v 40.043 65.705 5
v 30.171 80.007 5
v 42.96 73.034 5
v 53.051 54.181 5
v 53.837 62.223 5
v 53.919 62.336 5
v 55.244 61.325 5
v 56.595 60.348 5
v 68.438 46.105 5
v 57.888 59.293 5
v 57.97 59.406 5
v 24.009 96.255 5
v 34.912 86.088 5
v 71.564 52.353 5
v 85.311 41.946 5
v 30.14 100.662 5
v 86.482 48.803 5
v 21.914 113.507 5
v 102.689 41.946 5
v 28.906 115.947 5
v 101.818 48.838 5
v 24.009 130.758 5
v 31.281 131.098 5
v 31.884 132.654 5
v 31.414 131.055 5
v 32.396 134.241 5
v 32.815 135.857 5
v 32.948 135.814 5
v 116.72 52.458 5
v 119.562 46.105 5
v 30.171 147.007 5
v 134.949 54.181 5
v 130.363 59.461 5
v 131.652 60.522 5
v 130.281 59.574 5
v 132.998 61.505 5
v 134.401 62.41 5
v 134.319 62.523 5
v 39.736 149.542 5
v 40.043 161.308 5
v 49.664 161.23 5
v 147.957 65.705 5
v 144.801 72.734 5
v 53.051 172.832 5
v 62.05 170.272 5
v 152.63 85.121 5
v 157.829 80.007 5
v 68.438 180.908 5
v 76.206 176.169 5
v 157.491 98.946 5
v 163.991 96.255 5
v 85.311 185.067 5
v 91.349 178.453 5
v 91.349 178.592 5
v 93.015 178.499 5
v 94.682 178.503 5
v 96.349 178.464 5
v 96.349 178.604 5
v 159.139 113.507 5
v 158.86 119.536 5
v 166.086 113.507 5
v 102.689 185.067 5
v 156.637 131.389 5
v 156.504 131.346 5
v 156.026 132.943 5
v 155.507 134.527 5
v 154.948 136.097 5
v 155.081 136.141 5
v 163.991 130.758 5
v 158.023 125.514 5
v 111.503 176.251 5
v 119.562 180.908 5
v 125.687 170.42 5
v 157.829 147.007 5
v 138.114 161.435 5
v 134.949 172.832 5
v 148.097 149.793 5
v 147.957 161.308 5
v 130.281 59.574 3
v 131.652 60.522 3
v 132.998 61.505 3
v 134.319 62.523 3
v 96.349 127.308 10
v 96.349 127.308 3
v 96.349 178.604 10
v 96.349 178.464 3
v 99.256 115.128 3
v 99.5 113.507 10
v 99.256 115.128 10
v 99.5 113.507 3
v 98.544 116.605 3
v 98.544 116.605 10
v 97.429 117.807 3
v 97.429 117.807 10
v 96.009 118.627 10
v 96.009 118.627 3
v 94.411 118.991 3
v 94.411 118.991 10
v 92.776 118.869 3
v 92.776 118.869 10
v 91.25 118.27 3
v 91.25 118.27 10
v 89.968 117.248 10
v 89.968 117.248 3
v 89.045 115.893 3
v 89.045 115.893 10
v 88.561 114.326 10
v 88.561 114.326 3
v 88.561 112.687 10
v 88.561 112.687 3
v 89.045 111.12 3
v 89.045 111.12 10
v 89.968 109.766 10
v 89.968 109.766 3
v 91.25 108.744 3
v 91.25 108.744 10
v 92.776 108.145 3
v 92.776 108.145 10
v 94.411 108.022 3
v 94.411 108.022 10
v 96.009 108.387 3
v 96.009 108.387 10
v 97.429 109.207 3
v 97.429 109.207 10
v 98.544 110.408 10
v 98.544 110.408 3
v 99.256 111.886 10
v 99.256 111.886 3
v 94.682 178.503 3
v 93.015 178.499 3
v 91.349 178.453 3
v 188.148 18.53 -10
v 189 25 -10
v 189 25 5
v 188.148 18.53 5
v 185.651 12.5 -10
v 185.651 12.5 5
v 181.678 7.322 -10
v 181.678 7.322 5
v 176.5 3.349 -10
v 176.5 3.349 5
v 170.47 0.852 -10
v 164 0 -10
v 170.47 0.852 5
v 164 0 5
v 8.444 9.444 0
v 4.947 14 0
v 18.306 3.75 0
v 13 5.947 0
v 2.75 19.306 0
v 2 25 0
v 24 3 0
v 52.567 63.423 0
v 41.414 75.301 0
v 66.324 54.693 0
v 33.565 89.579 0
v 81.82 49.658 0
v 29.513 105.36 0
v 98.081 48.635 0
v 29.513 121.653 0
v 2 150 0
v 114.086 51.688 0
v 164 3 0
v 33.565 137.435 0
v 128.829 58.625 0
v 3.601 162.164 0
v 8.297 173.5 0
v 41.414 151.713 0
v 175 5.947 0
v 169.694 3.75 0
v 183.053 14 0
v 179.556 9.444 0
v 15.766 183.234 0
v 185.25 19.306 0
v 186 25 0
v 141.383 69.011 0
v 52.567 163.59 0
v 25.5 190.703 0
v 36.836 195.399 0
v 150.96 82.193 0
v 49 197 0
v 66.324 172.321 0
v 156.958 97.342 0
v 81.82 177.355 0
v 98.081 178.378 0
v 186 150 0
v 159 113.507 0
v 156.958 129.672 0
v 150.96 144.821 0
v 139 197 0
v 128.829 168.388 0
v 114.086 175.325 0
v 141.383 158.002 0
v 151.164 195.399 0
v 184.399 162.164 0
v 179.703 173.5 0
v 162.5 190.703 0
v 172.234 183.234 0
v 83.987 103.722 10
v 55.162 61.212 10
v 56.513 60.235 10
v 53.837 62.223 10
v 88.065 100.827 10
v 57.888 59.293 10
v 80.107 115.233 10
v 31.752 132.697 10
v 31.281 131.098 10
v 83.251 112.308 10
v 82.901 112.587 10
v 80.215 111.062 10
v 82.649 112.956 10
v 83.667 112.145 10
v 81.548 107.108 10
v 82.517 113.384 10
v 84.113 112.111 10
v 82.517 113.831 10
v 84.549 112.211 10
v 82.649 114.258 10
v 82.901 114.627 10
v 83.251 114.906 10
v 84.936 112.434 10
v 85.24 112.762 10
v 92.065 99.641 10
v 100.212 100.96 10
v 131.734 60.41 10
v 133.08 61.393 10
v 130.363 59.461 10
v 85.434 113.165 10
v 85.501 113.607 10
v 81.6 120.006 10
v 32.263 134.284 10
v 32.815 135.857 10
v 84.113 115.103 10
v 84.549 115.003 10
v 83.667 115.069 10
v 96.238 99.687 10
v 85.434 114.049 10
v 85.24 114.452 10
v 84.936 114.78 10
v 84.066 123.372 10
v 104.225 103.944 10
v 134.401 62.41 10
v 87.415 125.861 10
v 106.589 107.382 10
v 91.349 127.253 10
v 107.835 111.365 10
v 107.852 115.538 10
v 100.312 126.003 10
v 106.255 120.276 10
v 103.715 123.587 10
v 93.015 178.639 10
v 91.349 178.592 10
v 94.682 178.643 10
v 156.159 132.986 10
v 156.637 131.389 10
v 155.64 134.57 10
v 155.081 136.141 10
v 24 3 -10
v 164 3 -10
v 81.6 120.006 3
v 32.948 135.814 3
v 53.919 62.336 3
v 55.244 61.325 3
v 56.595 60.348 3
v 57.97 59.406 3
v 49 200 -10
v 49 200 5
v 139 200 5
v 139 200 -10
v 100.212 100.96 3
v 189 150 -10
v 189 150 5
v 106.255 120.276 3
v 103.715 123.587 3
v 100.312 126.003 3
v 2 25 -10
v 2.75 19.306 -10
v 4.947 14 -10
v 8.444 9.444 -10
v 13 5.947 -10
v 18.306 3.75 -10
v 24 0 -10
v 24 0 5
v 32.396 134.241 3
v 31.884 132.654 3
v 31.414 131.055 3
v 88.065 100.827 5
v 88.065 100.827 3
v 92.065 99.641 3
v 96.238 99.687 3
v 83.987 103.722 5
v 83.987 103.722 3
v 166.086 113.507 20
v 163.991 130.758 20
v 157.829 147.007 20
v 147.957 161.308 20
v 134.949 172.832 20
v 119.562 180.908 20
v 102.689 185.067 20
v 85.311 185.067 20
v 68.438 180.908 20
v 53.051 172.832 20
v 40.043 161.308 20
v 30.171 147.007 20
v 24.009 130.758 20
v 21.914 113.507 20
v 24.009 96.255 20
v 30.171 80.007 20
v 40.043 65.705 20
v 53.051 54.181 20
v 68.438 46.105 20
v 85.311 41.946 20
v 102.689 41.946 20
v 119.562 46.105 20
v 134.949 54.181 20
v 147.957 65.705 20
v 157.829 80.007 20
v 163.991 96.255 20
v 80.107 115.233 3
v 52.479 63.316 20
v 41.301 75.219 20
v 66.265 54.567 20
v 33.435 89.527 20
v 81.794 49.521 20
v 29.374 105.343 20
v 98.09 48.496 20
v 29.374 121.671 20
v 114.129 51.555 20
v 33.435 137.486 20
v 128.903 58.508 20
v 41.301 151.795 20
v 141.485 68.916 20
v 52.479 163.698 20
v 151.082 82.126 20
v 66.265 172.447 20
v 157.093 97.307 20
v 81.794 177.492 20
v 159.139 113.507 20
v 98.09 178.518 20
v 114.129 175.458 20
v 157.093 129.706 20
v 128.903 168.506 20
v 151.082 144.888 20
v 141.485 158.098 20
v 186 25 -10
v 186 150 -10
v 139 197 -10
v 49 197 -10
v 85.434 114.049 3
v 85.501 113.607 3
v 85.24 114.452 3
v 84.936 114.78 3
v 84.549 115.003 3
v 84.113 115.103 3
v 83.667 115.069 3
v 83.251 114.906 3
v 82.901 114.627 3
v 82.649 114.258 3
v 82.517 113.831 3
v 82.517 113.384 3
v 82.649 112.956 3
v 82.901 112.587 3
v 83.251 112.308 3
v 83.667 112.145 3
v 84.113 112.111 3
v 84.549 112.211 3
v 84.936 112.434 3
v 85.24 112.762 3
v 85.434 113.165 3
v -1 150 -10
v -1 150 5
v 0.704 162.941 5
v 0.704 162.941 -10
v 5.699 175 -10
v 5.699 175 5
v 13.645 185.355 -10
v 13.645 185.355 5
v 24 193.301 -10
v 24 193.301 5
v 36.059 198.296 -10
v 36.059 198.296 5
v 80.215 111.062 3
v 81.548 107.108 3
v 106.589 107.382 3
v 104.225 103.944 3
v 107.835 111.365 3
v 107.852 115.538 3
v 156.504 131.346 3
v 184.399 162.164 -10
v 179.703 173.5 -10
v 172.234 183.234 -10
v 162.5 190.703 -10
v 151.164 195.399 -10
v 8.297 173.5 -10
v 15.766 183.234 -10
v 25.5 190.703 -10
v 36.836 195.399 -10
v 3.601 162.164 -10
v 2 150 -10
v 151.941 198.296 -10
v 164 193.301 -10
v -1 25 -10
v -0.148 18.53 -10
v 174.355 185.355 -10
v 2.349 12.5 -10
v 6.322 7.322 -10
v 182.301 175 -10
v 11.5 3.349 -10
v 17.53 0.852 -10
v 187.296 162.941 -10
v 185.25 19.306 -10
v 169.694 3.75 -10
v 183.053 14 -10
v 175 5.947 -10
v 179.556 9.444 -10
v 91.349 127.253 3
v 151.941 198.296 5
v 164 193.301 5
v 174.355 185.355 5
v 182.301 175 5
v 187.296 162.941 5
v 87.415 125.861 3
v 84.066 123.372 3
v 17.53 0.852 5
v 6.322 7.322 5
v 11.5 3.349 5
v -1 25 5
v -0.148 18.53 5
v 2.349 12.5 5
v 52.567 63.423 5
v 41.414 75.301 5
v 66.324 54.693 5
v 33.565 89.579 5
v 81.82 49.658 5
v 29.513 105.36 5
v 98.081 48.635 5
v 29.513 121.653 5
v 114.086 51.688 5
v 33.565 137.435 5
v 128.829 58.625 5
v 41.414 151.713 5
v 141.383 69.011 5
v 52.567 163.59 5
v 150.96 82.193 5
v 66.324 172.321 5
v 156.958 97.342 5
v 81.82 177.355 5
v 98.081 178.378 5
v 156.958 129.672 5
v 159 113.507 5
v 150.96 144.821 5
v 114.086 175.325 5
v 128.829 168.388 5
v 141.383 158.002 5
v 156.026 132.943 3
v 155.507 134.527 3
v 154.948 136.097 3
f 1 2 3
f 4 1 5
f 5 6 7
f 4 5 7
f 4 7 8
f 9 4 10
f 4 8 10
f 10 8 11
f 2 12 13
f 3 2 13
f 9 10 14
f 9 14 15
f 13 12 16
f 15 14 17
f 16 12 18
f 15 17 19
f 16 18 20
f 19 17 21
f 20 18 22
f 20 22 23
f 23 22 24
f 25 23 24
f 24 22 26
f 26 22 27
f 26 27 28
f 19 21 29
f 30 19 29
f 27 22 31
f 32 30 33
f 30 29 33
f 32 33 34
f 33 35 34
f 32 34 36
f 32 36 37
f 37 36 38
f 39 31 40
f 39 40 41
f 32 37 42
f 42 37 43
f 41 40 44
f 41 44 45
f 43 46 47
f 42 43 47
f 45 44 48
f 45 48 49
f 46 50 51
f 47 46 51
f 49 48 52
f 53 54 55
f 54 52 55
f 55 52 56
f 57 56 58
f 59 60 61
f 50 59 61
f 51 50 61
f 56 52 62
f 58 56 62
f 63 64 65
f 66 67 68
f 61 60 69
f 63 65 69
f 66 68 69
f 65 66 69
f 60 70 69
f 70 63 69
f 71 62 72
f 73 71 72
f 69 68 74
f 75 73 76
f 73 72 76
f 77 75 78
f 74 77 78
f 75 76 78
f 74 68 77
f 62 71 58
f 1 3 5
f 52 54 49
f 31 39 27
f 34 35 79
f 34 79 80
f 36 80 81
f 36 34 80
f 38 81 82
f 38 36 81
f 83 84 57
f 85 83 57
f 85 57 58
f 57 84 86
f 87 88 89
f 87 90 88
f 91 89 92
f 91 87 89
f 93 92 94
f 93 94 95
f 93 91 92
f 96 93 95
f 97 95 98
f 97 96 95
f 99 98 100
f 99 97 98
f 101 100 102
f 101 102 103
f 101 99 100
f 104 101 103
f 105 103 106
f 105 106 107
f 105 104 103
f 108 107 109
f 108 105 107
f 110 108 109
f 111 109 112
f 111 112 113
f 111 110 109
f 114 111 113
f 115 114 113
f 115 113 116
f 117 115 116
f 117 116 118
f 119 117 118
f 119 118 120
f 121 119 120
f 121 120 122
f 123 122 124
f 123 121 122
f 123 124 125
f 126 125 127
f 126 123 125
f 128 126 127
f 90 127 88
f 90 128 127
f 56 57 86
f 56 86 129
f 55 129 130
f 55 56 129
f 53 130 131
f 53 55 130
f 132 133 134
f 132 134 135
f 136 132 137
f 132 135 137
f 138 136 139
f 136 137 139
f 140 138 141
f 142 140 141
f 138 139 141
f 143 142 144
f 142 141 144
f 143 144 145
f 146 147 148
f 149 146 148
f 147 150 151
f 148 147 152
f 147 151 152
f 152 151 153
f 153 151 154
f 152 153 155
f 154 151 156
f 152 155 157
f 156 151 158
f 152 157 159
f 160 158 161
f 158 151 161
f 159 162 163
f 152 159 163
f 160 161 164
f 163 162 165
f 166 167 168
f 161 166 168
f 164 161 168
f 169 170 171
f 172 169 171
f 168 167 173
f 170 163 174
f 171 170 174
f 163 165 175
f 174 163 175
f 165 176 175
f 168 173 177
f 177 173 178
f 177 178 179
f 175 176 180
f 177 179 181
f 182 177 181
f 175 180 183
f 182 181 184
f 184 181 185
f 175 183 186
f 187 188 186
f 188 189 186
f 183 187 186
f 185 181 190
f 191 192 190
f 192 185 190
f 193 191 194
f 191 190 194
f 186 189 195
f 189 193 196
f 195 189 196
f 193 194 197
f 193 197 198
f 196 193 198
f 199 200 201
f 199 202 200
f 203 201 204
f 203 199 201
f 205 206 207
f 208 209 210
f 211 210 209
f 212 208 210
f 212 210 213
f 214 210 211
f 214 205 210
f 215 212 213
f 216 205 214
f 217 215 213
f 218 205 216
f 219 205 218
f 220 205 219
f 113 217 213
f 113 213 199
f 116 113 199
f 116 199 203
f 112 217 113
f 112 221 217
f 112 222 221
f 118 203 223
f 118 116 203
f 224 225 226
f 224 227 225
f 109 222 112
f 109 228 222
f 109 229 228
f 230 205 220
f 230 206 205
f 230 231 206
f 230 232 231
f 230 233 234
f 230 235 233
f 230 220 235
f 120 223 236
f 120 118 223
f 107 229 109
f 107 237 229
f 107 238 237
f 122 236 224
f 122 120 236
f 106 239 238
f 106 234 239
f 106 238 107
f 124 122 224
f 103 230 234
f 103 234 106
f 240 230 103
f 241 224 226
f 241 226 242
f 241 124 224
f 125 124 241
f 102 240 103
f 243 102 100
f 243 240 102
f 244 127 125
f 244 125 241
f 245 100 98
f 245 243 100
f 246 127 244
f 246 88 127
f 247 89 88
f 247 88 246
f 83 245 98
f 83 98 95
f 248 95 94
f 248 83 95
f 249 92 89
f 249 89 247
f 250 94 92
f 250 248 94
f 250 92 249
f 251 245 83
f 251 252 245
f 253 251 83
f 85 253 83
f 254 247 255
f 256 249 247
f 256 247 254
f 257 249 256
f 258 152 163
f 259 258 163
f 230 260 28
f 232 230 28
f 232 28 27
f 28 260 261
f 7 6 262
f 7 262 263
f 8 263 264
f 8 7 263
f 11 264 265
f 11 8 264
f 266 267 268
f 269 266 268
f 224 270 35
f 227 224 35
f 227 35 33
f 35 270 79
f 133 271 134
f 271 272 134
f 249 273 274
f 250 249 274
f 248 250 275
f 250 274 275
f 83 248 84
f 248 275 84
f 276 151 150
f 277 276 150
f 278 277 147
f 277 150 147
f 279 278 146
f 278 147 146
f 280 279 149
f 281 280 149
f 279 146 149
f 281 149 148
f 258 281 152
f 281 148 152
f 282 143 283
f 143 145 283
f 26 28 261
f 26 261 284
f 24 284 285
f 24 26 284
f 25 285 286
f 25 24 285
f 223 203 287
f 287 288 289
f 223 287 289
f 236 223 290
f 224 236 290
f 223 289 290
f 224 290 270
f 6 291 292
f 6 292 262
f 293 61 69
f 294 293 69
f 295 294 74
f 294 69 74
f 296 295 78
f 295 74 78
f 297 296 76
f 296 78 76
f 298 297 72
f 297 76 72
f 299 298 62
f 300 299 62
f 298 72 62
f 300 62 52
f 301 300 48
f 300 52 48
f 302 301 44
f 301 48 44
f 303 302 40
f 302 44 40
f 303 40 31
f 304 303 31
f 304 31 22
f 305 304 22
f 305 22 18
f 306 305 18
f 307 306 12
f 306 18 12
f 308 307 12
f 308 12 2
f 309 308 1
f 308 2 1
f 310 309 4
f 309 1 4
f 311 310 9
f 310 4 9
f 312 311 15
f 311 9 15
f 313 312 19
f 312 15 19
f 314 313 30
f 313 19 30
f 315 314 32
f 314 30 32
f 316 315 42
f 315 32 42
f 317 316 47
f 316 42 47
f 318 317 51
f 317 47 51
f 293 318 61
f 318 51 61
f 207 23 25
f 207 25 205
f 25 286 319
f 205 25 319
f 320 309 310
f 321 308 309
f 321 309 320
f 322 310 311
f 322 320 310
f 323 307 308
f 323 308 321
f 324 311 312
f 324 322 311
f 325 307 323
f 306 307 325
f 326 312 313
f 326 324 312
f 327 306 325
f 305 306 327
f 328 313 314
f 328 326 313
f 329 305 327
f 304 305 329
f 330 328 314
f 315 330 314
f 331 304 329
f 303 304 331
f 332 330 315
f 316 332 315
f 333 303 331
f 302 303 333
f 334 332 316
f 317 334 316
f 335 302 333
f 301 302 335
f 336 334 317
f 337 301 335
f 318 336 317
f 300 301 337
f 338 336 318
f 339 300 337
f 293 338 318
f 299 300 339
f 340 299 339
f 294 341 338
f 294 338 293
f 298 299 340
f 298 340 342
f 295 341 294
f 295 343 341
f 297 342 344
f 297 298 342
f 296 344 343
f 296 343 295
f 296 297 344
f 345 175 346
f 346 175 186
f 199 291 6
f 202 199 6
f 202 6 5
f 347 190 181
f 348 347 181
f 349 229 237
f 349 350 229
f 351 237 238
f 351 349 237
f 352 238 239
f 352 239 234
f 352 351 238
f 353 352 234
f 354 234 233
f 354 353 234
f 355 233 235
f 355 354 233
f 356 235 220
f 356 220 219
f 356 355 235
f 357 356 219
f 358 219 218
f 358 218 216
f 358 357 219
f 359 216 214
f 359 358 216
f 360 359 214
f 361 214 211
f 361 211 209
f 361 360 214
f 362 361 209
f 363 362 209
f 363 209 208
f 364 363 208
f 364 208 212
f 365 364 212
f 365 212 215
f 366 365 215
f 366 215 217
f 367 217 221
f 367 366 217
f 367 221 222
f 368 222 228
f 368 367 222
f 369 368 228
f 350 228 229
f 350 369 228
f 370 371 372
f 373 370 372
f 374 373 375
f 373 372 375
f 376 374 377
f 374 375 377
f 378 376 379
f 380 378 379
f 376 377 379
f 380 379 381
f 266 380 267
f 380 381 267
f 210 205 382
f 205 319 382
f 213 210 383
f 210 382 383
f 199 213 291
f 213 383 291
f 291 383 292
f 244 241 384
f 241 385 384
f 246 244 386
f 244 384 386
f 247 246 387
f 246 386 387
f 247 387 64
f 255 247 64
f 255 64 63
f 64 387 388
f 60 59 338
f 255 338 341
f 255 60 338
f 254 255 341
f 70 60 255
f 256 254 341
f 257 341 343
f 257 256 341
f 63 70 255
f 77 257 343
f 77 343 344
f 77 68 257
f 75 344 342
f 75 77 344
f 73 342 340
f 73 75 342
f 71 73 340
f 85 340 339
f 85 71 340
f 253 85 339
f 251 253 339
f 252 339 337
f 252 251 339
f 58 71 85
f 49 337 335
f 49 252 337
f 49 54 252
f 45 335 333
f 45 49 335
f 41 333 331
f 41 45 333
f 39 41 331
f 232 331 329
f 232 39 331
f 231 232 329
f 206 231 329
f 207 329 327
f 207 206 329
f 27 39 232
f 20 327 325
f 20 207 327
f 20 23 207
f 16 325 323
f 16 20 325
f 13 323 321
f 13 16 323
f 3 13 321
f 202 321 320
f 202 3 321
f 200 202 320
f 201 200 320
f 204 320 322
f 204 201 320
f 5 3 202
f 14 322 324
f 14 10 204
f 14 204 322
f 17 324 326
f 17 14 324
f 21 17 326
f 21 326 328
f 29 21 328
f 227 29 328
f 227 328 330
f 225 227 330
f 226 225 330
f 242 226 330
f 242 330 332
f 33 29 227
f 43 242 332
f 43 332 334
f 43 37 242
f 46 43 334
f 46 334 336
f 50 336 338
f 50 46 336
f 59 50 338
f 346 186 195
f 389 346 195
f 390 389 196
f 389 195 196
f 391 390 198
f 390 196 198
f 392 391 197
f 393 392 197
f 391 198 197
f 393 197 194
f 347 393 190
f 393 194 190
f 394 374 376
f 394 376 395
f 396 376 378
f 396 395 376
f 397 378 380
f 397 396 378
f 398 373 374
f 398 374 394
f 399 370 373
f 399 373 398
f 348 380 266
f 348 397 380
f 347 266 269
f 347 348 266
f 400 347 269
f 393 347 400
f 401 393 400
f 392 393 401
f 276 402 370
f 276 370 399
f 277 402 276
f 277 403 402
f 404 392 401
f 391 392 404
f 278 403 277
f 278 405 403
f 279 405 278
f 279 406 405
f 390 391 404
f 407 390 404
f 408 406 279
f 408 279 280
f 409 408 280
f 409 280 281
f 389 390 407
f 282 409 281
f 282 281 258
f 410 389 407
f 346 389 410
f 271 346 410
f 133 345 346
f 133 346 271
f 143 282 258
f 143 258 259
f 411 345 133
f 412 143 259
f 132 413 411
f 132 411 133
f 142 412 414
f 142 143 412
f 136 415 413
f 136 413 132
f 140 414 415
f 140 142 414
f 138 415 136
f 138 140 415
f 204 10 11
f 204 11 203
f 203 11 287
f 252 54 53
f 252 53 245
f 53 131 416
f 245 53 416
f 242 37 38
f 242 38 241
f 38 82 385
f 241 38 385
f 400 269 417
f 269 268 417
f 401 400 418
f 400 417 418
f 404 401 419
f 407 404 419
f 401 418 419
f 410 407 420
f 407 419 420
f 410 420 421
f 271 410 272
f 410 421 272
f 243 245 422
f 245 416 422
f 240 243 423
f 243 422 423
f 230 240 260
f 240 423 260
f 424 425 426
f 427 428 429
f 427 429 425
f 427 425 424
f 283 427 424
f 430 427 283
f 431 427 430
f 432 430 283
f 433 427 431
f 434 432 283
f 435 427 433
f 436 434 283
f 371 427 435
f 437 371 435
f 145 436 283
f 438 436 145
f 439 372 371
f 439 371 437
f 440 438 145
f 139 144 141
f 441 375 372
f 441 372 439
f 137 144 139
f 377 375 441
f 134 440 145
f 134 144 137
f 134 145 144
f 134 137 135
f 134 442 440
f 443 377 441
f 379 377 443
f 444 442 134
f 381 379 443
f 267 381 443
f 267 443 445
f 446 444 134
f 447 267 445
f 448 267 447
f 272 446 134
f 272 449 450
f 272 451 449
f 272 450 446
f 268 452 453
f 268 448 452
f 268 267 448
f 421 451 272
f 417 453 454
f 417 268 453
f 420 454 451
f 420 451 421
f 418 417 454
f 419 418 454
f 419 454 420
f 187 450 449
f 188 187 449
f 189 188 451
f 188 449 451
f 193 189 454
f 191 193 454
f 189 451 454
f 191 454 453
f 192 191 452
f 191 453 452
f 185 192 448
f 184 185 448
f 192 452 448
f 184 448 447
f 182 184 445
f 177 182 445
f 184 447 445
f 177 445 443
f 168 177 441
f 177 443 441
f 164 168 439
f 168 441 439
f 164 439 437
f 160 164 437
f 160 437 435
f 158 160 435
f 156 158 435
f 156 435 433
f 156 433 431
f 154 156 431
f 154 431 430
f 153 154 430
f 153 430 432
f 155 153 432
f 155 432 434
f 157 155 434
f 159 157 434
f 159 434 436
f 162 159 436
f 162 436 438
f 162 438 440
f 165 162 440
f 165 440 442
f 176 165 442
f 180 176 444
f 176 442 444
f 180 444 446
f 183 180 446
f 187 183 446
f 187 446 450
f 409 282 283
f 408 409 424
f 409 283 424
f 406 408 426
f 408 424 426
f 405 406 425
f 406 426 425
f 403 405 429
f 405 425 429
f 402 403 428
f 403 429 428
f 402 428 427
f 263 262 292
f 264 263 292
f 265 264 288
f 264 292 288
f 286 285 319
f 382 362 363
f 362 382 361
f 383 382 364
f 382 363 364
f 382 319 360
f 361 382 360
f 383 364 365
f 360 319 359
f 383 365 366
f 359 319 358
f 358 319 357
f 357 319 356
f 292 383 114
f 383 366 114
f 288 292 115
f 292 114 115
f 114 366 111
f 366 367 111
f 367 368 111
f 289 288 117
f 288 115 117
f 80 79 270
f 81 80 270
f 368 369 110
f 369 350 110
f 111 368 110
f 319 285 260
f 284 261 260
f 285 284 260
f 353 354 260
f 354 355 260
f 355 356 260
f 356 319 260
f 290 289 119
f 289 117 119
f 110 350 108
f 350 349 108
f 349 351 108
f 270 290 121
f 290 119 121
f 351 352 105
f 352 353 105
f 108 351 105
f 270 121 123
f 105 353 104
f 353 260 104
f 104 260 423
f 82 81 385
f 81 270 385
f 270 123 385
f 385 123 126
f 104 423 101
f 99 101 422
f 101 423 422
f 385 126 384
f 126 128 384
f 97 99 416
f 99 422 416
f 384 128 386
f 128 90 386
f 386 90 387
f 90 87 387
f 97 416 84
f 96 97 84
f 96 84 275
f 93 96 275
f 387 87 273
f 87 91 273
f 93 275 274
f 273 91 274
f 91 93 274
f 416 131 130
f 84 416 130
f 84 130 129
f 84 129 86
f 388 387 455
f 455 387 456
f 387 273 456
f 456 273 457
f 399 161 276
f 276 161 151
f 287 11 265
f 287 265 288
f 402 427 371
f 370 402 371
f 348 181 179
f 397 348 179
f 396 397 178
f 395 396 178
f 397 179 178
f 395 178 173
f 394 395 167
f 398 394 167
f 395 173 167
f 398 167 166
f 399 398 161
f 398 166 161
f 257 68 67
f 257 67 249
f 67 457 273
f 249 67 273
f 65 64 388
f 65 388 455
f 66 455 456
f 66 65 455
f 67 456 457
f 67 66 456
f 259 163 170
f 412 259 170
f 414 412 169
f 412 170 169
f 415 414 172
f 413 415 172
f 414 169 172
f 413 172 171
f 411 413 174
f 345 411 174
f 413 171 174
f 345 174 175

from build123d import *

# Parameters (mm, degrees)
F1_DEPTH  = 5
F3_DEPTH  = 10
F4_R      = 65
F5_DEPTH  = 25
F6_R      = 1.5
F6_R_2    = 5.5
F7_DEPTH  = 2
F8_R      = 5
F9_DEPTH  = 25
F10_R     = 1.5
F11_DEPTH = 25
F12_DEPTH = 25
F13_DEPTH = 25
F14_R     = 72.085840391
F14_R_2   = 65.1394362423
F15_DEPTH = 15
F16_DEPTH = 5


with BuildPart() as f1:
    # F0 (on Top) → F1 (new body)
    with BuildSketch(Plane.XY):
        with BuildLine():
            Line((139, 200), (49, 200))
            ThreePointArc((49, 200), (13.6446609407, 185.3553390593), (-1, 150))
            Line((-1, 150), (-1, 25))
            ThreePointArc((-1, 25), (6.3223304703, 7.3223304703), (24, 0))
            Line((24, 0), (164, 0))
            ThreePointArc((164, 0), (181.6776695297, 7.3223304703), (189, 25))
            Line((189, 25), (189, 150))
            ThreePointArc((189, 150), (174.3553390593, 185.3553390593), (139, 200))
        make_face()
    extrude(amount=F1_DEPTH)

    # F2 (on face) → F3 (join)
    with BuildSketch(Plane(origin=(0, 0, 0), x_dir=(1, 0, 0), z_dir=(0, 0, -1))):
        with BuildLine():
            Line((49, -200), (139, -200))
            ThreePointArc((139, -200), (174.3553390593, -185.3553390593), (189, -150))
            Line((189, -150), (189, -25))
            ThreePointArc((189, -25), (181.6776695297, -7.3223304703), (164, 0))
            Line((164, 0), (24, 0))
            ThreePointArc((24, 0), (6.3223304703, -7.3223304703), (-1, -25))
            Line((-1, -25), (-1, -150))
            ThreePointArc((-1, -150), (13.6446609407, -185.3553390593), (49, -200))
        make_face()
        with BuildLine():
            Line((186, -25), (186, -150))
            ThreePointArc((186, -150), (172.2340187158, -183.2340187158), (139, -197))
            Line((139, -197), (49, -197))
            ThreePointArc((49, -197), (15.7659812842, -183.2340187158), (2, -150))
            Line((2, -150), (2, -25))
            ThreePointArc((2, -25), (8.4436508139, -9.4436508139), (24, -3))
            Line((24, -3), (164, -3))
            ThreePointArc((164, -3), (179.5563491861, -9.4436508139), (186, -25))
        make_face(mode=Mode.SUBTRACT)
    extrude(amount=F3_DEPTH)

    # F4 (on face) → F5 (cut)
    with BuildSketch(Plane.XY.offset(5)):
        with Locations((94, 113.5067418218)):
            Circle(F4_R)
    extrude(amount=-F5_DEPTH, mode=Mode.SUBTRACT)

    # F8 (on face) → F9 (cut)
    with BuildSketch(Plane(origin=(0, 0, 3), x_dir=(1, 0, 0), z_dir=(0, 0, -1))):
        with Locations((94, -113.5067418218)):
            Circle(F8_R)
    extrude(amount=-F9_DEPTH, mode=Mode.SUBTRACT)

    # F10 (on face) → F11 (cut)
    with BuildSketch(Plane(origin=(0, 0, 3), x_dir=(1, 0, 0), z_dir=(0, 0, -1))):
        with Locations((94.0000067605, 105.5067418218)):
            Circle(F10_R)
        with Locations((86, 113.5067350613)):
            Circle(F10_R)
        with Locations((93.9999932395, 121.5067418218)):
            Circle(F10_R)
        with Locations((102, 113.5067485823)):
            Circle(F10_R)
    extrude(amount=-F11_DEPTH, mode=Mode.SUBTRACT)

    # F10 (on face) → F12 (cut)
    with BuildSketch(Plane(origin=(0, 0, 3), x_dir=(1, 0, 0), z_dir=(0, 0, -1))):
        with Locations((86, 113.5067350613)):
            Circle(F10_R)
        with Locations((94.0000067605, 105.5067418218)):
            Circle(F10_R)
        with Locations((102, 113.5067485823)):
            Circle(F10_R)
        with Locations((93.9999932395, 121.5067418218)):
            Circle(F10_R)
    extrude(amount=-F12_DEPTH, mode=Mode.SUBTRACT)

    # F8 (on face) → F13 (cut)
    with BuildSketch(Plane(origin=(0, 0, 3), x_dir=(1, 0, 0), z_dir=(0, 0, -1))):
        with Locations((94, -113.5067418218)):
            Circle(F8_R)
    extrude(amount=-F13_DEPTH, mode=Mode.SUBTRACT)


with BuildPart() as f7:
    # F6 (on face) → F7 (new body)
    with BuildSketch(Plane.XY.offset(5)):
        with BuildLine():
            Line((91.3489636779, 178.4526578321), (91.3489636779, 127.2534507522))
            ThreePointArc((91.3489636779, 127.2534507522), (85.6473138732, 124.7420715662), (81.5998298548, 120.005647912))
            Line((81.5998298548, 120.005647912), (32.947575311, 135.8137236794))
            ThreePointArc((32.947575311, 135.8137236794), (32.1347862264, 133.4490417079), (31.4135480954, 131.0548482151))
            Line((31.4135480954, 131.0548482151), (80.1068876178, 115.2334231289))
            ThreePointArc((80.1068876178, 115.2334231289), (80.7334444719, 109.0347730807), (83.9873097061, 103.7217516287))
            Line((83.9873097061, 103.7217516287), (53.9185627687, 62.3356719729))
            ThreePointArc((53.9185627687, 62.3356719729), (55.9163433267, 60.8319367021), (57.9704818098, 59.4061520007))
            Line((57.9704818098, 59.4061520007), (88.0646206604, 100.8271806269))
            ThreePointArc((88.0646206604, 100.8271806269), (94.1535038969, 99.5075833987), (100.2119872248, 100.9603792126))
            Line((100.2119872248, 100.9603792126), (130.2807341621, 59.5742995569))
            ThreePointArc((130.2807341621, 59.5742995569), (132.3282195336, 61.0096220209), (134.3189850648, 62.5226321076))
            Line((134.3189850648, 62.5226321076), (104.2248462142, 103.9436607337))
            ThreePointArc((104.2248462142, 103.9436607337), (107.3614261537, 109.3267548435), (107.8519095365, 115.5376534872))
            Line((107.8519095365, 115.5376534872), (156.5041640802, 131.3457292546))
            ThreePointArc((156.5041640803, 131.3457292546), (155.7717990733, 133.736542593), (154.9480213521, 136.0974189533))
            Line((154.9480213521, 136.0974189533), (106.2546818297, 120.2759938671))
            ThreePointArc((106.2546818297, 120.2759938671), (102.1043116043, 124.9225262197), (96.3489636779, 127.3082768683))
            Line((96.3489636779, 127.3082768683), (96.3489636779, 178.4642846451))
            ThreePointArc((96.3489636779, 178.4642846451), (93.8488518399, 178.5065660849), (91.3489636779, 178.4526578321))
        make_face()
        with Locations((84.0005032645, 113.607066474)):
            Circle(F6_R, mode=Mode.SUBTRACT)
        with Locations((94, 113.5067418218)):
            Circle(F6_R_2, mode=Mode.SUBTRACT)
    extrude(amount=-F7_DEPTH)



with BuildPart() as f15:
    # F14 (on face) → F15 (new body)
    with BuildSketch(Plane.XY.offset(5)):
        with Locations((94, 113.5067418218)):
            Circle(F14_R)
        with Locations((94, 113.5067418218)):
            Circle(F14_R_2, mode=Mode.SUBTRACT)
    extrude(amount=F15_DEPTH)


with BuildPart() as f7_1:
    add(f7.part)

    add(f15.part)  # F16 merges F15
    # F6 (on face) → F16 (join)
    with BuildSketch(Plane.XY.offset(5)):
        with BuildLine():
            Line((91.3489636779, 185.4482434715), (91.3489636779, 127.2534507522))
            ThreePointArc((91.3489636779, 127.2534507522), (85.6473138732, 124.7420715662), (81.5998298548, 120.005647912))
            Line((81.5998298548, 120.005647912), (26.3054357596, 137.9718856448))
            Line((26.3054357596, 137.9718856448), (24.7603507878, 133.2166030633))
            Line((24.7603507878, 133.2166030633), (80.1068876178, 115.2334231289))
            ThreePointArc((80.1068876178, 115.2334231289), (80.7334444719, 109.0347730807), (83.9873097061, 103.7217516287))
            Line((83.9873097061, 103.7217516287), (49.813494768, 56.6855305943))
            Line((49.813494768, 56.6855305943), (53.8585797398, 53.7466043329))
            Line((53.8585797398, 53.7466043329), (88.0646206604, 100.8271806269))
            ThreePointArc((88.0646206604, 100.8271806269), (94.1535038969, 99.5075833987), (100.2119872248, 100.9603792126))
            Line((100.2119872248, 100.9603792126), (134.3858021629, 53.9241581783))
            Line((134.3858021629, 53.9241581783), (138.4308871348, 56.8630844397))
            Line((138.4308871348, 56.8630844397), (104.2248462142, 103.9436607337))
            ThreePointArc((104.2248462142, 103.9436607337), (107.3614261537, 109.3267548435), (107.8519095365, 115.5376534872))
            Line((107.8519095365, 115.5376534872), (163.1463036316, 133.50389122))
            Line((163.1463036316, 133.50389122), (161.6012186598, 138.2591738015))
            Line((161.6012186598, 138.2591738015), (106.2546818297, 120.2759938671))
            ThreePointArc((106.2546818297, 120.2759938671), (102.1043116043, 124.9225262197), (96.3489636779, 127.3082768683))
            Line((96.3489636779, 127.3082768683), (96.3489636779, 185.4482434715))
            Line((96.3489636779, 185.4482434715), (91.3489636779, 185.4482434715))
        make_face()
        with Locations((84.0005032645, 113.607066474)):
            Circle(F6_R, mode=Mode.SUBTRACT)
        with Locations((94, 113.5067418218)):
            Circle(F6_R_2, mode=Mode.SUBTRACT)
    extrude(amount=F16_DEPTH)


solid = Compound([f1.part, f7_1.part])
